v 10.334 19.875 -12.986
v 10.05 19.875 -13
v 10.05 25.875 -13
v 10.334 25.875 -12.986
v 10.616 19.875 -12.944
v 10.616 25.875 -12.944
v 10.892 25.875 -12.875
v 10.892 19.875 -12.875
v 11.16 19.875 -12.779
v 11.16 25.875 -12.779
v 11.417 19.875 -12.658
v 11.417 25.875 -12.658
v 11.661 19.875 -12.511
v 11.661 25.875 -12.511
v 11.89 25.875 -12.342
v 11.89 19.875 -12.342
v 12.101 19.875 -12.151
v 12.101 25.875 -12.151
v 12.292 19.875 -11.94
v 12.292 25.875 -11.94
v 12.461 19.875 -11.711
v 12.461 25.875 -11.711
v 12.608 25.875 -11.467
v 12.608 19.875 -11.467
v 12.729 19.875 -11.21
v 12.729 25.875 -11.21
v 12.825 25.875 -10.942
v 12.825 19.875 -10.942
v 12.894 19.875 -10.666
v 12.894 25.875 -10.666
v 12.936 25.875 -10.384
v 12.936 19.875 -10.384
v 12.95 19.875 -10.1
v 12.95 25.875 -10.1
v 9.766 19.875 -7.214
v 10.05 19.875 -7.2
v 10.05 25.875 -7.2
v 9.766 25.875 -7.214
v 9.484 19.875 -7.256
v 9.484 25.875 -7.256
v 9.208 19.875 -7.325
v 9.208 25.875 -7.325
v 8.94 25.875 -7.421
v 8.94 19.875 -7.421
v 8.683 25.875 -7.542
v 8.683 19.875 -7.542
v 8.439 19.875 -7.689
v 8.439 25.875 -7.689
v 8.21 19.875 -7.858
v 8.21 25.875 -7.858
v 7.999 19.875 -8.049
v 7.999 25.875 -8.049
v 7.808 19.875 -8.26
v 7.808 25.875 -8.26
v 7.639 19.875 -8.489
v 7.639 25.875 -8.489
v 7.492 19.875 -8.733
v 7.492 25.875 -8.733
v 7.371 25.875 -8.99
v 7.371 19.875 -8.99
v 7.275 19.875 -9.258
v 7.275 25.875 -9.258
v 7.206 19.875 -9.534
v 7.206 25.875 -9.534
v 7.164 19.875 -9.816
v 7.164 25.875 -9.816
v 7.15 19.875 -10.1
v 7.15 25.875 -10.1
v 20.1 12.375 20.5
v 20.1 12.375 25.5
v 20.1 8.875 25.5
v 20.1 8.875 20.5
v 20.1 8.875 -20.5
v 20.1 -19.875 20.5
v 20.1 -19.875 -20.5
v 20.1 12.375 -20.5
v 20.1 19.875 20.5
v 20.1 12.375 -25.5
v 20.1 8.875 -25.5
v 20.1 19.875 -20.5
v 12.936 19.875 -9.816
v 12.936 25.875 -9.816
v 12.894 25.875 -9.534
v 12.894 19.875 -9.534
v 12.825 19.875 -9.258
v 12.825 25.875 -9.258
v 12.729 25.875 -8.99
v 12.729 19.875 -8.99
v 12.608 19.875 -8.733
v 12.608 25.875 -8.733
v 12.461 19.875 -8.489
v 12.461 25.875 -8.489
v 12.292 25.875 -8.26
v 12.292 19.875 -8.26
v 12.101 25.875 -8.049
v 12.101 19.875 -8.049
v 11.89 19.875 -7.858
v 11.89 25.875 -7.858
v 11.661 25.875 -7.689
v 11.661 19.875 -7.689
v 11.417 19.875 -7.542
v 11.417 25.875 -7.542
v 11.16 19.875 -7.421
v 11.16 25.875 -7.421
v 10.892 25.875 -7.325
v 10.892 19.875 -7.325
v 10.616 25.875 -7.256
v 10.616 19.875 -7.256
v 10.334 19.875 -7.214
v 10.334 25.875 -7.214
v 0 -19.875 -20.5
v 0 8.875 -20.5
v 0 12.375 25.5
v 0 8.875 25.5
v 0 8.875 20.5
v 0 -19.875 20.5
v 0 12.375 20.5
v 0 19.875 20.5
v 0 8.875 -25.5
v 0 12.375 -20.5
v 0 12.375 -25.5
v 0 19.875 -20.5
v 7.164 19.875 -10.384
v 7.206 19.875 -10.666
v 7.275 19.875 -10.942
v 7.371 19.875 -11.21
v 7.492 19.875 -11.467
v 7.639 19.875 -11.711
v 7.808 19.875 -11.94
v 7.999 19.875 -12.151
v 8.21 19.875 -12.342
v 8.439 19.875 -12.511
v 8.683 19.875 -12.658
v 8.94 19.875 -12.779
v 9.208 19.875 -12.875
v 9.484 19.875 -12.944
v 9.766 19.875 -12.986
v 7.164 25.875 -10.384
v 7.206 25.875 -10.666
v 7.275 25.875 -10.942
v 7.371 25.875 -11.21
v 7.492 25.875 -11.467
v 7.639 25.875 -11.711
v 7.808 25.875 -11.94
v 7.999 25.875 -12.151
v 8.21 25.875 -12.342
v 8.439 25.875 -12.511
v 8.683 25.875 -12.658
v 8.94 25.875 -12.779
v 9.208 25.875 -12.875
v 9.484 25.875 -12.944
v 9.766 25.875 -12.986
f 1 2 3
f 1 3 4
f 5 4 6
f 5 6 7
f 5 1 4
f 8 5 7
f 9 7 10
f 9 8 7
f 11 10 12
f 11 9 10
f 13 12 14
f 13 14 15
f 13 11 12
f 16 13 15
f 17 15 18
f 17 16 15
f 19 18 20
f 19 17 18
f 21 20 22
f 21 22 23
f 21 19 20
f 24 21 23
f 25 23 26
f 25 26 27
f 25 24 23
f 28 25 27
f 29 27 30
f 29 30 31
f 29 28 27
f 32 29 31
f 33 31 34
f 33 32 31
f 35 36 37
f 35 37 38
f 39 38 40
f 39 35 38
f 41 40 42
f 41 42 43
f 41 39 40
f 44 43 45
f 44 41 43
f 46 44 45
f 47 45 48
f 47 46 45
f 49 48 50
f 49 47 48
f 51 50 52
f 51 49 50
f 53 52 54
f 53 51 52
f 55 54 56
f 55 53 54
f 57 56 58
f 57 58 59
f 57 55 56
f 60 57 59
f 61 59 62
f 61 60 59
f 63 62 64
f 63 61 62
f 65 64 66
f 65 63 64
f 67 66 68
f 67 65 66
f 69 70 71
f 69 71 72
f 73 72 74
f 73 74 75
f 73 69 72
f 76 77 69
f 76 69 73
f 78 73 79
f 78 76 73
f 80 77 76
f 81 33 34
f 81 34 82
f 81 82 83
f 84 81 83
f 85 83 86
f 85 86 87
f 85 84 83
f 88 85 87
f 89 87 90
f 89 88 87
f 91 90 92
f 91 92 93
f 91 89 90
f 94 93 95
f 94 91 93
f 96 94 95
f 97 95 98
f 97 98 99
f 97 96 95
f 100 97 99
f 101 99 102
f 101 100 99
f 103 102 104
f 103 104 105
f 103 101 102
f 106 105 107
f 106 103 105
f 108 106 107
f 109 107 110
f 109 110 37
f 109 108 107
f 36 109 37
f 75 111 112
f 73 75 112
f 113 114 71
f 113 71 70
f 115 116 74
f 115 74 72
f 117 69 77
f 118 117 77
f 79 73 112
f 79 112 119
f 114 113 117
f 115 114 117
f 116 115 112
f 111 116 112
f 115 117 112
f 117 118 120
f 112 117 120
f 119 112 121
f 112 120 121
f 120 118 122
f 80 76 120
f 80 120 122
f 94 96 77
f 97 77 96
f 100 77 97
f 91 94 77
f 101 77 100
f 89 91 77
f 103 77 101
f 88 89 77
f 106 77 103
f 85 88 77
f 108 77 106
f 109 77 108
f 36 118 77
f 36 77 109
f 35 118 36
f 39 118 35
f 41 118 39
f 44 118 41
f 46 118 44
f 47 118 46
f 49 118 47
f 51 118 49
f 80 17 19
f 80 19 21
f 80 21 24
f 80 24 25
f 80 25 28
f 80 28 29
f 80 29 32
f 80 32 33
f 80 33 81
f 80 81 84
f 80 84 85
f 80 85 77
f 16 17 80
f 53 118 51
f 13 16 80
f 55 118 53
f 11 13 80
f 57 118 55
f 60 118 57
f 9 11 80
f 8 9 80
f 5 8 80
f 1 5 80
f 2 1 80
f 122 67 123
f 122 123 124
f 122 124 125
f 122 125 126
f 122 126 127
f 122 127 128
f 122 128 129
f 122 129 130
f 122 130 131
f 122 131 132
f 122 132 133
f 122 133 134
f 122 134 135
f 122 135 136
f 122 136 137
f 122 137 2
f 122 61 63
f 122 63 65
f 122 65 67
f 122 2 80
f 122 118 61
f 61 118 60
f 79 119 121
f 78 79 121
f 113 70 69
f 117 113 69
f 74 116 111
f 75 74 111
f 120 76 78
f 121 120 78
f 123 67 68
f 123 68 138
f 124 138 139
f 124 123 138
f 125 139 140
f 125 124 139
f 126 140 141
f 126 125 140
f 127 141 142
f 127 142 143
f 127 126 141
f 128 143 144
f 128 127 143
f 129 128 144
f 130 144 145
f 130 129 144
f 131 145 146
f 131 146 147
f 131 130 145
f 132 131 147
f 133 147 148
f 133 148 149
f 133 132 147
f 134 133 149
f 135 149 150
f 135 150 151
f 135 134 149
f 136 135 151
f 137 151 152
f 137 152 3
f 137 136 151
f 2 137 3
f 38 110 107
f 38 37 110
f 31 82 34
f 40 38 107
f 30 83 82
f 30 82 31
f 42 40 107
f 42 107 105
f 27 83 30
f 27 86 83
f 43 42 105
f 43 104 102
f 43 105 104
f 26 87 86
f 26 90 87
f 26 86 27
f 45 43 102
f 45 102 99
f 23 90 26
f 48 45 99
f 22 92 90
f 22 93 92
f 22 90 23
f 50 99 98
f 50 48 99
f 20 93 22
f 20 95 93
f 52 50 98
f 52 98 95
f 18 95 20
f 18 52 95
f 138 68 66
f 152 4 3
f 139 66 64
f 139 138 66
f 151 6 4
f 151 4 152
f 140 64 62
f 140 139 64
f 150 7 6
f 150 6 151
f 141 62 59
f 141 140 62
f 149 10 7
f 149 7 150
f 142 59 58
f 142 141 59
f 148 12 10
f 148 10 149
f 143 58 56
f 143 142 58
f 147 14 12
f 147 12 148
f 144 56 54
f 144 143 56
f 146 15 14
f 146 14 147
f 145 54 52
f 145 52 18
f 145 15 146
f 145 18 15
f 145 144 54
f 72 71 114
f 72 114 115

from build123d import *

# Parameters (mm, degrees)
SKETCH2_W           = 41
SKETCH2_H           = 39.75
SKETCH2_W_2         = 5
SKETCH2_H_2         = 3.5
SKETCH2_W_3         = 5.8
SKETCH2_H_3         = 6
BOSS_EXTRUDE1_DEPTH = 20.1
CUT_EXTRUDE1_DEPTH  = 6


with BuildPart() as part:
    # Sketch2 → Boss-Extrude1 (new body)
    with BuildSketch(Plane(origin=(0, 0, 0), x_dir=(0, 0, -1), z_dir=(1, 0, 0))):
        Rectangle(SKETCH2_W, SKETCH2_H)
        with Locations((-23, 10.625)):
            Rectangle(SKETCH2_W_2, SKETCH2_H_2)
        with Locations((10.1, 22.875)):
            Rectangle(SKETCH2_W_3, SKETCH2_H_3)
        with Locations((23, 10.625)):
            Rectangle(SKETCH2_W_2, SKETCH2_H_2)
    extrude(amount=BOSS_EXTRUDE1_DEPTH)

    # Sketch3 → Cut-Extrude1 (cut)
    with BuildSketch(Plane(origin=(0, 19.875, 0), x_dir=(1, 0, 0), z_dir=(0, 1, 0))):
        with BuildLine():
            Line((10.05, 7.2), (12.95, 7.2))
            Line((12.95, 7.2), (12.95, 10.1))
            ThreePointArc((12.95, 10.1), (12.100609665, 8.049390335), (10.05, 7.2))
        make_face()
        with BuildLine():
            ThreePointArc((10.05, 13), (12.100609665, 12.150609665), (12.95, 10.1))
            Line((12.95, 10.1), (12.95, 13))
            Line((12.95, 13), (10.05, 13))
        make_face()
        with BuildLine():
            ThreePointArc((7.15, 10.1), (7.999390335, 12.150609665), (10.05, 13))
            Line((10.05, 13), (7.15, 13))
            Line((7.15, 13), (7.15, 10.1))
        make_face()
        with BuildLine():
            Line((7.15, 7.2), (10.05, 7.2))
            ThreePointArc((10.05, 7.2), (7.999390335, 8.049390335), (7.15, 10.1))
            Line((7.15, 10.1), (7.15, 7.2))
        make_face()
        Polygon((0, 7.2), (7.15, 7.2), (7.15, 10.1), (7.15, 13), (0, 13), align=None)
        Polygon((12.95, 7.2), (20.1, 7.2), (20.1, 13), (12.95, 13), (12.95, 10.1), align=None)
    extrude(amount=CUT_EXTRUDE1_DEPTH, mode=Mode.SUBTRACT)


solid = part.part
